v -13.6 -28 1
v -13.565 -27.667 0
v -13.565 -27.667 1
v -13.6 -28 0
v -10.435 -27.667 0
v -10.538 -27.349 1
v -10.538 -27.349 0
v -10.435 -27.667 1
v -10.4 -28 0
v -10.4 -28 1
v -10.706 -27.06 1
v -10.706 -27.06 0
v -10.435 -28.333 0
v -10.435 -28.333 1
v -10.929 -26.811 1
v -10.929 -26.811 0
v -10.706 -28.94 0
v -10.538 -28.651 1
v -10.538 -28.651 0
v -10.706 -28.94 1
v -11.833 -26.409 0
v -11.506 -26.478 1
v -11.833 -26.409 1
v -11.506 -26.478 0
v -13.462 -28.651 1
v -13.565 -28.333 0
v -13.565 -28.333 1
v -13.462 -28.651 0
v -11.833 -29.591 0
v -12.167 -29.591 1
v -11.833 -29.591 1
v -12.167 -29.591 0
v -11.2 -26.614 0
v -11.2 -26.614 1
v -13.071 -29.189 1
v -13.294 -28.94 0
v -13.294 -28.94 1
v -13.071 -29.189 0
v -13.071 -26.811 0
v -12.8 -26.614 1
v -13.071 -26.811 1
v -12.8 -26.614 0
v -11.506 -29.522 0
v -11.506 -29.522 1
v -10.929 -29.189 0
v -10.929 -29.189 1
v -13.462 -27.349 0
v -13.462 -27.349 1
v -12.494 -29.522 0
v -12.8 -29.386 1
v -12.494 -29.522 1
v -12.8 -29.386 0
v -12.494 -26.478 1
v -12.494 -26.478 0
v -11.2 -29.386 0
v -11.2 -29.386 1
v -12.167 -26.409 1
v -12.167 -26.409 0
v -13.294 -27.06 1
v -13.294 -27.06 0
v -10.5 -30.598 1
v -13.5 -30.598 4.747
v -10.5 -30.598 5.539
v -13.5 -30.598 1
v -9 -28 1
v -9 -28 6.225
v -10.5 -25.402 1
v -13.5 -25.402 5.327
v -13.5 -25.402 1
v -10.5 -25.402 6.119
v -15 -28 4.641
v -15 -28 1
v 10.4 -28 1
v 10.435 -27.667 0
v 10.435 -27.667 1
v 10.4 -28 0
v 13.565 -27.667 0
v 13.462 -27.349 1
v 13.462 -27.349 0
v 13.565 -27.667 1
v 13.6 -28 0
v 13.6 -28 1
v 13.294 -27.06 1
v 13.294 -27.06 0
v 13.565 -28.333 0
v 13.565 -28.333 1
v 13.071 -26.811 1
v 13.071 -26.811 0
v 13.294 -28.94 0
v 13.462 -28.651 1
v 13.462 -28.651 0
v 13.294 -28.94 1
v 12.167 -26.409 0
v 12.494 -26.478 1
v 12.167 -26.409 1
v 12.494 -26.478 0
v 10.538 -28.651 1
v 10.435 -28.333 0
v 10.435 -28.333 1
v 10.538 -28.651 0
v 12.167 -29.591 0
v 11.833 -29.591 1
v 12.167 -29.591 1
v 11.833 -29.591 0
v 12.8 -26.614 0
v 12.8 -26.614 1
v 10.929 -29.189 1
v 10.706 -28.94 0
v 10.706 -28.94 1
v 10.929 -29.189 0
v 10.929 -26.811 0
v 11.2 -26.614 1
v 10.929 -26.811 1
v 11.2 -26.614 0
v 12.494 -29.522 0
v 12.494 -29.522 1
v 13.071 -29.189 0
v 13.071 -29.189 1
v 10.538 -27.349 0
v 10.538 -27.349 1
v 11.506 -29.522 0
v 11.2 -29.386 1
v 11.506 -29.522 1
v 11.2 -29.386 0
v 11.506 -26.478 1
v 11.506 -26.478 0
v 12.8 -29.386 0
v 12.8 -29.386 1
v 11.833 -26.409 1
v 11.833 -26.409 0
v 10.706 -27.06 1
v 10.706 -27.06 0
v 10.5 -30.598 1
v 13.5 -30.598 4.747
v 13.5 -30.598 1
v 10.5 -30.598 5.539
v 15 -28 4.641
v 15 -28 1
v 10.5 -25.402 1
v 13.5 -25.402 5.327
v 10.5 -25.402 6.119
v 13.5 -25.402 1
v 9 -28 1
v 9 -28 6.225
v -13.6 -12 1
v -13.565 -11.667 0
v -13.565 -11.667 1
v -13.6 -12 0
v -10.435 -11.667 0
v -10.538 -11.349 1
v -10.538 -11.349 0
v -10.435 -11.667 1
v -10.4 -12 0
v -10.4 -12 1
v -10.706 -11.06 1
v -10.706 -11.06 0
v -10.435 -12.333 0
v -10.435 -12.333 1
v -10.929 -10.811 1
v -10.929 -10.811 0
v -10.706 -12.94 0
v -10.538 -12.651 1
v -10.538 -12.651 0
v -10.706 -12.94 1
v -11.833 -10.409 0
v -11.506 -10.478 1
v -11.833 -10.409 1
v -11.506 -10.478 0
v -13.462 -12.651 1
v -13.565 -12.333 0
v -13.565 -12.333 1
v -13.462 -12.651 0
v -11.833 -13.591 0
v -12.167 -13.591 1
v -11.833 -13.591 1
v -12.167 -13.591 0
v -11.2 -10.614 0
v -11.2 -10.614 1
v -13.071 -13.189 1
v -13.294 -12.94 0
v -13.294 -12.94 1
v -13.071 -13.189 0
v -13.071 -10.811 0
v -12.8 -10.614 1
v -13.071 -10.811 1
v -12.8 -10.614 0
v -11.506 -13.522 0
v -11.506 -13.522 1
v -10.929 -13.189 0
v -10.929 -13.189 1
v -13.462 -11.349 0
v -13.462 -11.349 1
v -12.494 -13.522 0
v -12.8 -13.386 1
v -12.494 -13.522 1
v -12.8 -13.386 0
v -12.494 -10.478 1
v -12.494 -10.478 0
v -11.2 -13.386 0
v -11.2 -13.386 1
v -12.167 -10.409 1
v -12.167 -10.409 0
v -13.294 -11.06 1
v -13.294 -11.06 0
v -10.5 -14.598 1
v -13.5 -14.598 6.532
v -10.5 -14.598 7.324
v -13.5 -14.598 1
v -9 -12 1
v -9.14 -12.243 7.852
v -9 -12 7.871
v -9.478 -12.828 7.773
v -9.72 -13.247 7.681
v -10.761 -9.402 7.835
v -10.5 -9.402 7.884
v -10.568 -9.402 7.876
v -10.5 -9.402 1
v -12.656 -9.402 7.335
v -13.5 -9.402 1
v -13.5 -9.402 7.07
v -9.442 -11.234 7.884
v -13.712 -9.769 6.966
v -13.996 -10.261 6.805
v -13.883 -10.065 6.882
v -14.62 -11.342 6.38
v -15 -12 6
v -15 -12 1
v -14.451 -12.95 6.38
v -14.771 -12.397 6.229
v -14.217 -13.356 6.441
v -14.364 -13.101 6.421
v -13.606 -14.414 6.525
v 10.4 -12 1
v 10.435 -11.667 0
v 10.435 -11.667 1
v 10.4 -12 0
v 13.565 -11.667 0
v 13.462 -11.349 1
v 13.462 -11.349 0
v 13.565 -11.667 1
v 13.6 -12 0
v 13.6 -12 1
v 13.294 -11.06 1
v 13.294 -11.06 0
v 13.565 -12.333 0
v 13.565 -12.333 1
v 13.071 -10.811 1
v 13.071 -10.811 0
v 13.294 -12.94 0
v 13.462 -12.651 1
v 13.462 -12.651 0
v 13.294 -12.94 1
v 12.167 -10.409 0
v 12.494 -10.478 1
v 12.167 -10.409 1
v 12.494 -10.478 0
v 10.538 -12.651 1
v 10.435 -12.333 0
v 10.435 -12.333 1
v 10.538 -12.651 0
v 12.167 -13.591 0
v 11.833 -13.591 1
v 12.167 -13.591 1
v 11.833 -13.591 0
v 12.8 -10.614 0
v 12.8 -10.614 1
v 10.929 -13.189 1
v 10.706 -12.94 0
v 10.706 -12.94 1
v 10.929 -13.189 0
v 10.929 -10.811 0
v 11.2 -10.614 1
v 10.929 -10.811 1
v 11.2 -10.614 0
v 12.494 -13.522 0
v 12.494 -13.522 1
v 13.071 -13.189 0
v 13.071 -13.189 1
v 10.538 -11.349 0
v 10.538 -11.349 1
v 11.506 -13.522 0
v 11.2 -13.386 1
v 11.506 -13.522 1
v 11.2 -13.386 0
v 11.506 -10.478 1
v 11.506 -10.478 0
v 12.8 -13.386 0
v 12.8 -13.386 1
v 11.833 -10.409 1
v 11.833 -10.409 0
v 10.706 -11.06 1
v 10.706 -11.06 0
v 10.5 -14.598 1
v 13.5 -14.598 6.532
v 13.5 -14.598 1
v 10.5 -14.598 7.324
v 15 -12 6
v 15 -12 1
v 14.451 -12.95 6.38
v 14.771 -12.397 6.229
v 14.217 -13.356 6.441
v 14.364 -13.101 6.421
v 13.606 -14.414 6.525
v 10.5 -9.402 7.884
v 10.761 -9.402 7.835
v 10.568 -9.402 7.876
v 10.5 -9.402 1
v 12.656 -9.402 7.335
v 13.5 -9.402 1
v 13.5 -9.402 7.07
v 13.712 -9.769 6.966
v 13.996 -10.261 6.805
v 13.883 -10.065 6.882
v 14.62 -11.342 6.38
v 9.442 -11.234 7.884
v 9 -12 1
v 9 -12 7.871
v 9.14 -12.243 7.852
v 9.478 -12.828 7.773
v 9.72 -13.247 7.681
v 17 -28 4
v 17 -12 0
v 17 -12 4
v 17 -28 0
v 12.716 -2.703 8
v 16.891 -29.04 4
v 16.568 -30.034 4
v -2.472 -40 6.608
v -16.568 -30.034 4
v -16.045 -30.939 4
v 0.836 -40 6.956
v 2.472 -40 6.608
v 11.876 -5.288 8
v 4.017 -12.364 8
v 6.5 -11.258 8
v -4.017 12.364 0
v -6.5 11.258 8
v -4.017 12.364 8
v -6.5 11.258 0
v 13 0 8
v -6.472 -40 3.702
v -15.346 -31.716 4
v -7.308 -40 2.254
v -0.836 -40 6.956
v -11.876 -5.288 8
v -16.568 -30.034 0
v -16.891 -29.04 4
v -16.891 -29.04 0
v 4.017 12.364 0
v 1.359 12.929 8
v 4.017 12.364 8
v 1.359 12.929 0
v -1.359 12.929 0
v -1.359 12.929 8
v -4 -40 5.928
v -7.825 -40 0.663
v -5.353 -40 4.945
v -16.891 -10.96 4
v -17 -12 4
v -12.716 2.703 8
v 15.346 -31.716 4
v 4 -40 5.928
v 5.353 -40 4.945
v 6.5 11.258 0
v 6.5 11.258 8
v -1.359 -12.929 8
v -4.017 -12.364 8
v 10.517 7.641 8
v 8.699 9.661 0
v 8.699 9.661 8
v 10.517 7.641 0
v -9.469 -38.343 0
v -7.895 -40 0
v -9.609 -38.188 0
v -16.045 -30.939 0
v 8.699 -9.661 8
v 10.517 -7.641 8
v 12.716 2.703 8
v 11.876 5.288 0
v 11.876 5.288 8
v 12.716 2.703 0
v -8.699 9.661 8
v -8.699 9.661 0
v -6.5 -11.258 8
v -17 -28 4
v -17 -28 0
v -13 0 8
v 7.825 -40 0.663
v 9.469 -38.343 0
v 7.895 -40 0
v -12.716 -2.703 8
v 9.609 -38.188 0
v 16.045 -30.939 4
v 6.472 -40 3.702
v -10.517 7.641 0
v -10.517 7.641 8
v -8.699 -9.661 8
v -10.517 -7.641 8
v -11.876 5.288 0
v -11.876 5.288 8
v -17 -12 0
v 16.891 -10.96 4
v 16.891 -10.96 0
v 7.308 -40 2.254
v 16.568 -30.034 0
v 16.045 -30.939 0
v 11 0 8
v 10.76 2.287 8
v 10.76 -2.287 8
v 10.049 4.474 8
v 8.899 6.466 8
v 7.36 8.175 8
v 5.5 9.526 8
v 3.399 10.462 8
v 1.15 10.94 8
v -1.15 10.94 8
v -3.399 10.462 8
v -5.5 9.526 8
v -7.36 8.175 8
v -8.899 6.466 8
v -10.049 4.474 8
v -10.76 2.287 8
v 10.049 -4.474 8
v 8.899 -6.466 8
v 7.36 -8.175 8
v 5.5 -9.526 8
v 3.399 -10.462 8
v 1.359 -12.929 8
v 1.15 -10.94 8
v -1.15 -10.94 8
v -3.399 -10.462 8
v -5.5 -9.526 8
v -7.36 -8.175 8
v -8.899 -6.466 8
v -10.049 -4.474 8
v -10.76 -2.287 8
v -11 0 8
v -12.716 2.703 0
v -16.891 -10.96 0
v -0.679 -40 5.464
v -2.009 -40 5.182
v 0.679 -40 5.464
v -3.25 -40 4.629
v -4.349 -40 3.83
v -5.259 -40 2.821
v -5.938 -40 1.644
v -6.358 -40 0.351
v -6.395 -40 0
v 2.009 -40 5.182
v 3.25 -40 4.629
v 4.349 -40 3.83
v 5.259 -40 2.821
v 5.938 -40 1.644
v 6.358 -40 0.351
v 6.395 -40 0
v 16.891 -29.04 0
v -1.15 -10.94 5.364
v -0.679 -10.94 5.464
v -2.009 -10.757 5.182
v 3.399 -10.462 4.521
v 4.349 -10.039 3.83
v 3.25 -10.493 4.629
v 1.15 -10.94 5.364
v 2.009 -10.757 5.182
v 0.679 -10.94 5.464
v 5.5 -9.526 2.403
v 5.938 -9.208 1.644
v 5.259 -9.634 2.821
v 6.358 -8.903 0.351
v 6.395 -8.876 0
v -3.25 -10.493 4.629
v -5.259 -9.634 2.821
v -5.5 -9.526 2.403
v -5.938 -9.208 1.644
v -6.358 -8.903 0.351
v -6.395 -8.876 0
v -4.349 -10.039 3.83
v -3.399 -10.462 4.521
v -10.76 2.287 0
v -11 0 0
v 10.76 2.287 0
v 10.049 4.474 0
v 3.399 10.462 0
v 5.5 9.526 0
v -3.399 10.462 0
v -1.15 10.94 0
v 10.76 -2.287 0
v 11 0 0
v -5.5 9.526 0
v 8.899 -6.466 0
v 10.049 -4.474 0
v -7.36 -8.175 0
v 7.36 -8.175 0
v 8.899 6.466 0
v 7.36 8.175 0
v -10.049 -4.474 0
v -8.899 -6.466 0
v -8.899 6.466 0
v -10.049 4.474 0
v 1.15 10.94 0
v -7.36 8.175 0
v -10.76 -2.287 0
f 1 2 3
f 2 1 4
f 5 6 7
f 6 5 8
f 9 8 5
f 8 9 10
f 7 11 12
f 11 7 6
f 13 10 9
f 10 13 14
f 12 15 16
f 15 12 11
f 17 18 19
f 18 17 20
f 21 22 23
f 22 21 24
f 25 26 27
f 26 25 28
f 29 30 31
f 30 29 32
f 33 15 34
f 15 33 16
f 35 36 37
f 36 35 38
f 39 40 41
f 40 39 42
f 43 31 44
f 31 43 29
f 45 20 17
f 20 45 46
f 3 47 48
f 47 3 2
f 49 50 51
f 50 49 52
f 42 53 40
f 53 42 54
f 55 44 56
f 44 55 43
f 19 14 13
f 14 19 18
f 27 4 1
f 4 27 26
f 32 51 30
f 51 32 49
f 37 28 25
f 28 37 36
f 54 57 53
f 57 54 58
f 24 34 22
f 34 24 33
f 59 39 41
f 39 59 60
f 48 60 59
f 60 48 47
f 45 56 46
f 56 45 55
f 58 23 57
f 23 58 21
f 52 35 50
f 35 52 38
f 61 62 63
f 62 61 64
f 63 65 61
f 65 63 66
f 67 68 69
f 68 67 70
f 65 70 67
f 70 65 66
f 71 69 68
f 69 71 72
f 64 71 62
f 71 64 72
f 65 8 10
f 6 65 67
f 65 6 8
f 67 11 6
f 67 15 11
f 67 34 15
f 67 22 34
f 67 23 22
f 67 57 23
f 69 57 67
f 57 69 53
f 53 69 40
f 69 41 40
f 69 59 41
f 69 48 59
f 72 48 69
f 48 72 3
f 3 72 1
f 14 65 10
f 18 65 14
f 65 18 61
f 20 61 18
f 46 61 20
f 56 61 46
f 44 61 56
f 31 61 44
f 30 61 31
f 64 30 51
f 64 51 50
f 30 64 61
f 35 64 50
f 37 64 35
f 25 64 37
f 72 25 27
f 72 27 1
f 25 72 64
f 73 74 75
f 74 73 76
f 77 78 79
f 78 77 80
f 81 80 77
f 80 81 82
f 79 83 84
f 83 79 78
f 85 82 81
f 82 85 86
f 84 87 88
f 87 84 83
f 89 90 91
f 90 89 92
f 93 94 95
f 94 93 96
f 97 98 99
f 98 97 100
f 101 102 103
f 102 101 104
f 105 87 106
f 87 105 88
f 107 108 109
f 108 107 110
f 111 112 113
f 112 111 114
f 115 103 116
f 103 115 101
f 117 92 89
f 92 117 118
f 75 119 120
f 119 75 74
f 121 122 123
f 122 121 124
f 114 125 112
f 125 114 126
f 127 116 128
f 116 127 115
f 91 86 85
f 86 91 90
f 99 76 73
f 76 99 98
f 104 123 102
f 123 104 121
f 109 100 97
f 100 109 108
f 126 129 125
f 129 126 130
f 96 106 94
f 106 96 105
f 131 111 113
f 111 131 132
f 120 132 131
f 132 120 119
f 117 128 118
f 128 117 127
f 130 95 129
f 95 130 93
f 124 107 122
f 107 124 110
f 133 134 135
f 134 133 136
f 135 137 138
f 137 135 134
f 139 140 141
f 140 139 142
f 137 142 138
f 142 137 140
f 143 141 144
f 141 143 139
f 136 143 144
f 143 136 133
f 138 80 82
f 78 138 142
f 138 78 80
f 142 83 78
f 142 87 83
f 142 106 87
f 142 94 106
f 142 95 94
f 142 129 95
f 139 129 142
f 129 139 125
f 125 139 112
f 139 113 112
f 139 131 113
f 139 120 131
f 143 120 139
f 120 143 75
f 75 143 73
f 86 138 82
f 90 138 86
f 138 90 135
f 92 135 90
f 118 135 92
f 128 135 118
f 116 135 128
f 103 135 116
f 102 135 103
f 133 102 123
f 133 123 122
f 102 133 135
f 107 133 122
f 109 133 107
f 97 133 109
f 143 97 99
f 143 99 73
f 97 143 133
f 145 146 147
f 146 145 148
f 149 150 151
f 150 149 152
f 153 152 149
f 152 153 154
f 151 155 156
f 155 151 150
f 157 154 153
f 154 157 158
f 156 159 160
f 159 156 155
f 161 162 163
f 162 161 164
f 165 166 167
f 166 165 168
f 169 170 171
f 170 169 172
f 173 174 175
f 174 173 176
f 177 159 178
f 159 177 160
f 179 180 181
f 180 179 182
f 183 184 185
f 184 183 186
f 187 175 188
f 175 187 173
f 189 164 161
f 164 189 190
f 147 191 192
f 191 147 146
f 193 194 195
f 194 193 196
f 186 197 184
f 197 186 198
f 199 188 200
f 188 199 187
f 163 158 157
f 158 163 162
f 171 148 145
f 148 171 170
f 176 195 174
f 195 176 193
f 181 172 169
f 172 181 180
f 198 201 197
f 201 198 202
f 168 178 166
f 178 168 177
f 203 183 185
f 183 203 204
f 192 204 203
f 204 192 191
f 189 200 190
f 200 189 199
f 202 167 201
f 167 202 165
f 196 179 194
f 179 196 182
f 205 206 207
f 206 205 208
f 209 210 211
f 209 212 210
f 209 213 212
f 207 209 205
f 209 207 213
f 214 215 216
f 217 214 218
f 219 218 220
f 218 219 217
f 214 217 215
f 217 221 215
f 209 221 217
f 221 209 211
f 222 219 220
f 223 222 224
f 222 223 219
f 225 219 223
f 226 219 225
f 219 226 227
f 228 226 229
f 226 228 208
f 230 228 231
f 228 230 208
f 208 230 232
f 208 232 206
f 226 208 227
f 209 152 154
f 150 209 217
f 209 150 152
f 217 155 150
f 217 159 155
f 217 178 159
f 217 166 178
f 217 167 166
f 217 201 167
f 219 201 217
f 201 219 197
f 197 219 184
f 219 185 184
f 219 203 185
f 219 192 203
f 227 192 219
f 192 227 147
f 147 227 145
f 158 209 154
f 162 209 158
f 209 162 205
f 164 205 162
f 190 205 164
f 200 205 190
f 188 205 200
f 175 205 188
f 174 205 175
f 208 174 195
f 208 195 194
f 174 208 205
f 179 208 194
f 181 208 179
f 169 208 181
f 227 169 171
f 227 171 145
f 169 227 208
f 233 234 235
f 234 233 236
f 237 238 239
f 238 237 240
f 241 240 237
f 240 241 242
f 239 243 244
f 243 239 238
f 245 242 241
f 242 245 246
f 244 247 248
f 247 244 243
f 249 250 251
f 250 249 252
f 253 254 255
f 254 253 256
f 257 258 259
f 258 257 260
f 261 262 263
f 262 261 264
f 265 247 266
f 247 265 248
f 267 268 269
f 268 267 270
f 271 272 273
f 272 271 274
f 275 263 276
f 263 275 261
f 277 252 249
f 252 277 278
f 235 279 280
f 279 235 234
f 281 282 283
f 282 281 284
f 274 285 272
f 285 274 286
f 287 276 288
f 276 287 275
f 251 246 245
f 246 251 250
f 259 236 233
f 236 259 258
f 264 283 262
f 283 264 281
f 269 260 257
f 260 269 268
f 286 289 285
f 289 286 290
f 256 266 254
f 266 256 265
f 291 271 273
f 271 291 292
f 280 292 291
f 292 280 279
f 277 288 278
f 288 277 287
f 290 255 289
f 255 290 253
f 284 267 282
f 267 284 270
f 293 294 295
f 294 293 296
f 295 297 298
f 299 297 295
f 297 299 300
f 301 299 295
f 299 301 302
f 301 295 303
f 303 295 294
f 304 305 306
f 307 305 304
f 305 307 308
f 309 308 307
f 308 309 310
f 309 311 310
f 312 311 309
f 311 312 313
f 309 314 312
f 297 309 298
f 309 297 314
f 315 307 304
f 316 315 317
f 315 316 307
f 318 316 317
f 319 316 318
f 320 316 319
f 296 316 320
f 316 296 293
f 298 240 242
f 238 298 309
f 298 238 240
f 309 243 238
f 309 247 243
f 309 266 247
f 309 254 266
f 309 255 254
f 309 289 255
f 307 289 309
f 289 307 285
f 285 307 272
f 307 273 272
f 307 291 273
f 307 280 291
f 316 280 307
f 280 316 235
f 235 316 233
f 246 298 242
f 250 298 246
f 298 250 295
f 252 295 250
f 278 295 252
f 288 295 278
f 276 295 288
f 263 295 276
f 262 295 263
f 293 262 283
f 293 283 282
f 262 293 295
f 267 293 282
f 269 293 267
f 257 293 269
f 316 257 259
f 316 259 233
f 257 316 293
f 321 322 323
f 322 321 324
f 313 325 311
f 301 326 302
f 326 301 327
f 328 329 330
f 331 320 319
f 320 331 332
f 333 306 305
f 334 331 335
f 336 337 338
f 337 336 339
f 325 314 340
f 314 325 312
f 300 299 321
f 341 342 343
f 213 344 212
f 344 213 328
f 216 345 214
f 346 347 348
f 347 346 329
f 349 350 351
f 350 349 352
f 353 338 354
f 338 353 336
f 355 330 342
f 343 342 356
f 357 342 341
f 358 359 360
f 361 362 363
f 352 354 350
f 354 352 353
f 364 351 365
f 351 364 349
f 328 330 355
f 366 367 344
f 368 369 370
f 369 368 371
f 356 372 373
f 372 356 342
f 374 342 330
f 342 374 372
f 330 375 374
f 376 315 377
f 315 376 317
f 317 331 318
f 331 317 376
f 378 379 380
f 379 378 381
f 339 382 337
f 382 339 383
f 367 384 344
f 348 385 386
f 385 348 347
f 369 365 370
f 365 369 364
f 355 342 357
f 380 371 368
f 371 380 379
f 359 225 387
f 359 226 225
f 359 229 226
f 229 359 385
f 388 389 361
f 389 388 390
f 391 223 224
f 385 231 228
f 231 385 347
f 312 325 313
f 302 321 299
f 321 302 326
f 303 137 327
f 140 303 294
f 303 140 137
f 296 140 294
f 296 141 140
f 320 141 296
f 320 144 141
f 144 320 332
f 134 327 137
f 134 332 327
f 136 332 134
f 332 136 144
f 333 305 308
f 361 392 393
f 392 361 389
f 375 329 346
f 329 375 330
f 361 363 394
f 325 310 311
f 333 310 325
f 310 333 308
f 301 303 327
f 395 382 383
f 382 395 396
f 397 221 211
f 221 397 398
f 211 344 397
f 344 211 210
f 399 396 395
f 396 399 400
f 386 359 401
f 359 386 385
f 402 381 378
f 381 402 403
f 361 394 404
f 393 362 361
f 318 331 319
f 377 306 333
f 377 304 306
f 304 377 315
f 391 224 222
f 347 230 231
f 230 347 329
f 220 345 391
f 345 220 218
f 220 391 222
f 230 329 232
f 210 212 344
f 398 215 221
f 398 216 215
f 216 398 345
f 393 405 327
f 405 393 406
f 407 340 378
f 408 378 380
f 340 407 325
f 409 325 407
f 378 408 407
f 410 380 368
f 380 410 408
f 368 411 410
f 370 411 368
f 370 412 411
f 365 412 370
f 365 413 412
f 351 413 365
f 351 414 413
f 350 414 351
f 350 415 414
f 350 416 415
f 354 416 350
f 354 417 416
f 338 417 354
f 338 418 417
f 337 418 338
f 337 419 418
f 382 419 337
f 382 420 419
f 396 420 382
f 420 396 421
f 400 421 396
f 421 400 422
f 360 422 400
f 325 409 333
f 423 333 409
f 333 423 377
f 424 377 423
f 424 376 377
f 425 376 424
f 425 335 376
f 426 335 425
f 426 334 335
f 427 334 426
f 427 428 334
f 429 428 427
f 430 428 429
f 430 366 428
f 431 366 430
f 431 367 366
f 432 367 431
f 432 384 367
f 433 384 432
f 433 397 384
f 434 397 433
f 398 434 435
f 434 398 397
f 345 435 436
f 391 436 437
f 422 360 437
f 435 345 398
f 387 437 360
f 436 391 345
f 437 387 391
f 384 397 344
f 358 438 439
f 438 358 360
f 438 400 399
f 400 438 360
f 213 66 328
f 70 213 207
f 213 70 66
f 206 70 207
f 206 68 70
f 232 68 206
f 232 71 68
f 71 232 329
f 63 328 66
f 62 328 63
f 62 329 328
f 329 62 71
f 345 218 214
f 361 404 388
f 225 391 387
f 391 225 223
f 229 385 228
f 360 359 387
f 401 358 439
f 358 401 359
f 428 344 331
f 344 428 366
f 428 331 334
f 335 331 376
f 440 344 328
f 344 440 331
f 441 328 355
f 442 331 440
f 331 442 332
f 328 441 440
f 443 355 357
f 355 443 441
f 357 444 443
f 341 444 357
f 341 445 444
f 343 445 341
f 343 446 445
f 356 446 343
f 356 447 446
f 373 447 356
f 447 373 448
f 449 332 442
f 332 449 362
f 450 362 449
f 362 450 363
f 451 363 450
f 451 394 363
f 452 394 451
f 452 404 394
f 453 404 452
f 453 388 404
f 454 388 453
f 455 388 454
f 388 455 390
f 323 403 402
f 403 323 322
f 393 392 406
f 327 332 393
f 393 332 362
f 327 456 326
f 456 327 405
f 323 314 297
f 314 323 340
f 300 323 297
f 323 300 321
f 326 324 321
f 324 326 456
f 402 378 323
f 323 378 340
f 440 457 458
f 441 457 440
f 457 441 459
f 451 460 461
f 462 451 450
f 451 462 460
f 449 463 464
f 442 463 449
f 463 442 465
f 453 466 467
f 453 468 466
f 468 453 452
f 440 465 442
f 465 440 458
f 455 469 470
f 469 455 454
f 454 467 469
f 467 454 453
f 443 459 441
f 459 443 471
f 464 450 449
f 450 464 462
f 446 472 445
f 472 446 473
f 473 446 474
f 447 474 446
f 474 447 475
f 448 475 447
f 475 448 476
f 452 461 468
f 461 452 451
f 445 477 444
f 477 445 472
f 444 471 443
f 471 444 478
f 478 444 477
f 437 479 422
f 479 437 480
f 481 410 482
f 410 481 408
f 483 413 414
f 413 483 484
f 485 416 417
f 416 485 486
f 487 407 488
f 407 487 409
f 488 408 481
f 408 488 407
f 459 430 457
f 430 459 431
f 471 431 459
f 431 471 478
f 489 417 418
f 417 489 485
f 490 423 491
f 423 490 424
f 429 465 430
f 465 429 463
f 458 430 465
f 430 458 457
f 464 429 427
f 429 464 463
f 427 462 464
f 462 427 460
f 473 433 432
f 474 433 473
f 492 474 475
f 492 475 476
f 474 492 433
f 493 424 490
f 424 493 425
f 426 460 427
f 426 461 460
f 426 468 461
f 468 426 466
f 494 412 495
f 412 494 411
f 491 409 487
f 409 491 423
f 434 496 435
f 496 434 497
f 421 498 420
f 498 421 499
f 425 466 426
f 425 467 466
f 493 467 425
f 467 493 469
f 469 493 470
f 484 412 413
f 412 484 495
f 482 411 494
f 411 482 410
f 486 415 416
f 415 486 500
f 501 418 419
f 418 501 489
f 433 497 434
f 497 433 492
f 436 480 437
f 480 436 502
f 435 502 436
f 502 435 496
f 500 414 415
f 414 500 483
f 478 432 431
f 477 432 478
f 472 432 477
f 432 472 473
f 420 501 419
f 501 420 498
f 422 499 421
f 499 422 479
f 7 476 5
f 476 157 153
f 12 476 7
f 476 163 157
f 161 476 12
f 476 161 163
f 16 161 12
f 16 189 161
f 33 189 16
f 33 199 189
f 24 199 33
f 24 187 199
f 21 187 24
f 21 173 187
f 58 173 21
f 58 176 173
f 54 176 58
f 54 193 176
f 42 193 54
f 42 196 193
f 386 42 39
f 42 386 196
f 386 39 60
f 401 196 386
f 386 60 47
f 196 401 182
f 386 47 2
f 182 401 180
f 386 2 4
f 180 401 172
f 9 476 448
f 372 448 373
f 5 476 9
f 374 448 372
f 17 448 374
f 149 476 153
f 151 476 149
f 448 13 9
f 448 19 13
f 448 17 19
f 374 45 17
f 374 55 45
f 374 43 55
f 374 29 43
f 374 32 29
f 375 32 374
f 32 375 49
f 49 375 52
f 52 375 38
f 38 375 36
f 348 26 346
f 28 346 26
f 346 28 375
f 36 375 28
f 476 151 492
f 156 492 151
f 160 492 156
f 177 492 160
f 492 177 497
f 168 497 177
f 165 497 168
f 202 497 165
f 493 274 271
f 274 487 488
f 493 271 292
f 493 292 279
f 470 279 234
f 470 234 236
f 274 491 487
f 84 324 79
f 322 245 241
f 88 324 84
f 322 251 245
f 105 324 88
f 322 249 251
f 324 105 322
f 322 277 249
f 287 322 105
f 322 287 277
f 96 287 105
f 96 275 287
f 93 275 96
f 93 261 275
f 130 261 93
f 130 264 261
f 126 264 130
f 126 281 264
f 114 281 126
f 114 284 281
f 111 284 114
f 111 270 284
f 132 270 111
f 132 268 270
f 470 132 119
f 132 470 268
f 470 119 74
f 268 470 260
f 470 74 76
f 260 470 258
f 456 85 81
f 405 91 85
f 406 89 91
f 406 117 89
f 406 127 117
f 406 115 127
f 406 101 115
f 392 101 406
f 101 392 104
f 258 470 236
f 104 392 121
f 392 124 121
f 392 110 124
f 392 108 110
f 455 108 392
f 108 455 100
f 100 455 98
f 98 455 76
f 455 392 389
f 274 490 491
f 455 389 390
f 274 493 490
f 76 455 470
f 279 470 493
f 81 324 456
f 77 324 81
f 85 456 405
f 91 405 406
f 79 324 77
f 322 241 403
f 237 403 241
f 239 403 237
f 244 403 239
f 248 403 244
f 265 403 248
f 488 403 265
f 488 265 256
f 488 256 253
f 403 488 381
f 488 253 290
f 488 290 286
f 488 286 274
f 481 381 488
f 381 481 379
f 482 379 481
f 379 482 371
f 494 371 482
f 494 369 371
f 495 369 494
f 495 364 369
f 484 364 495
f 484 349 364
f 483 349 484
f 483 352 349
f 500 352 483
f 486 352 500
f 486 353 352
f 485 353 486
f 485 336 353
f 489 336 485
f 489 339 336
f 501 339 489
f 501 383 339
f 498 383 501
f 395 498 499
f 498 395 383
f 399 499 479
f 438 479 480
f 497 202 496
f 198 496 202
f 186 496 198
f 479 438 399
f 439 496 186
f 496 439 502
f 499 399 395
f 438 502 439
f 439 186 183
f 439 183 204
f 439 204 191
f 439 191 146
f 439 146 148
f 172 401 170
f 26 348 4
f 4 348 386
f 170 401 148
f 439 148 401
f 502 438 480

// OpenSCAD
// file: ../lib/ALU_profile_holder_top.scad
include <../../parameters.scad>



module ALU_profile_holder_top(deep=35) {
    wall_thickness = ALU_profile_holder_wall_thickness;
    
    module screw_holes() {
        translate([wall_thickness/2, 8, ALU_profile_width/2]) {
            rotate([0, 90, 0]) 
                cylinder(d=M6_screw_diameter, h=wall_thickness*2, center=true, $fn=20);
        }
        translate([wall_thickness/2, deep-10, ALU_profile_width/2]) {
                rotate([0, 90, 0])
                cylinder(d=M6_screw_diameter, h=wall_thickness*2, center=true, $fn=20);
            
        }
    }
    
    difference() {
        cube([ALU_profile_width+wall_thickness*2, deep+wall_thickness*2, ALU_profile_width]);
        translate([wall_thickness, -0.1, -0.1])
            cube([ALU_profile_width, deep+0.1, ALU_profile_width+0.2]);
        
        screw_holes();
        translate([ALU_profile_width+wall_thickness, 0, 0])
            screw_holes();
    }
}

ALU_profile_holder_top(35);
// file: ../888_3002.scad
include <../parameters.scad>
use <./lib/ALU_profile_holder_top.scad>


module carbon_tube() {
	difference() {
		cylinder(d=13, h=400, $fn=30);

		translate([0, 0, -1])
		cylinder(d=11, h=402, $fn=30);
	}
}

module 888_3002(side=true) {
	difference() {
		union() {
			hull() {
				cylinder(d=16, h=40, $fn=30);

				translate([-12, -5, 28])
				rotate([-90, 0, 0])
				cylinder(d=10, h=10, $fn=30);

				translate([12, -5, 28])
				rotate([-90, 0, 0])
				cylinder(d=10, h=10, $fn=30);

				translate([-12, -5, 12])
				rotate([-90, 0, 0])
				cylinder(d=10, h=10, $fn=30);

				translate([12, -5, 12])
				rotate([-90, 0, 0])
				cylinder(d=10, h=10, $fn=30);

				translate([0, -9, 0])
				rotate([-90, 0, 0])
				cylinder(d=26, h=18, $fn=30);

			}
		}
		
		// cut side
		if(side) {
			translate([-30, 0, -50])
			cube([200, 50, 100]);
		} else {
			translate([-30, -100, -50])
			cube([200, 100, 100]);
		}
		
		// carbon tube
		translate([0, 0, 0])
		cylinder(d=13, h=400, $fn=30);

		// tube holding screws
		translate([-12, -10, 28])
		rotate([-90, 0, 0])
		union() {
			cylinder(d=3.2, h=16, $fn=30);
			
			cylinder(d=8, h=3, $fn=30);

			translate([0, 0, 12])
			cylinder(d=6, h=10, $fn=6);
		}
		translate([12, -10, 28])
		rotate([-90, 0, 0])
		union() {
			cylinder(d=3.2, h=16, $fn=30);
			
			cylinder(d=8, h=3, $fn=30);

			translate([0, 0, 12])
			cylinder(d=6, h=10, $fn=6);
		}
		translate([-12, -10, 12])
		rotate([-90, 0, 0])
		union() {
			cylinder(d=3.2, h=16, $fn=30);
			
			cylinder(d=8, h=3, $fn=30);

			translate([0, 0, 12])
			cylinder(d=6, h=10, $fn=6);
		}
		translate([12, -10, 12])
		rotate([-90, 0, 0])
		union() {
			cylinder(d=3.2, h=16, $fn=30);
			
			cylinder(d=8, h=3, $fn=30);

			translate([0, 0, 12])
			cylinder(d=6, h=10, $fn=6);
		}

		// bearing hole
		translate([0, -15, 0])
		rotate([-90, 0, 0])
		cylinder(d=22, h=30, $fn=30);

		// part gap
		translate([-100, -1, -50])
		cube([200, 2, 200]);

		translate([0, -.1, -50])
		cube([200, .2, 200]);
	}
}

translate([0, 0, 11])
#carbon_tube();

888_3002();
888_3002(false);
// file: ../../parameters.scad
maximum_printable_size = 150;

layer_thickness = 0.3;
global_clearance = 0.5;


//Screw diameter and nut for M10 [mm]
M10_screw_diameter = 10.4;
M10_head_height = 10;
M10_head_diameter = 16+0.5;
M10_nut_height = 10.5;
M10_nut_diameter = 25.5;
M10_nut_pocket = 22.3;

//Screw diameter for M8 [mm]
M8_screw_diameter = 8.6;
M8_head_height = 8;
M8_head_diameter = 13.5;
M8_nut_height = 7.5;
M8_square_nut_thin_height = 4.5;
M8_nut_diameter = 14.4 + 0.5;
M8_nut_pocket = 13 + 0.5;
M8_washer_diameter = 16;
M8_washer_thickness = 1.5;


//Screw diameter and nut for M6 [mm]
M6_screw_diameter=6.5;
M6_head_diameter = 10+0.5;
M6_head_height = 6;
M6_nut_height = 4.9;
M6_nut_diameter = 11.8;
M6_nut_pocket = 10.4;
M6_square_nut_height = 3;
M6_square_nut_diameter = 10;
M6_washer_thickness = 1.6;

//Screw diameter and nut for M5 [mm]
M5_screw_diameter=5.5;
M5_head_height = 5;
M5_head_diameter = 13+0.5;
M5_nut_height = 4.5;
M5_nut_diameter = 9.4;
M5_nut_pocket = 8.4;

//Screw diameter and nut for M4 [mm]
M4_screw_diameter=4.5;
M4_screw_head_height = 4;
M4_nut_height = 3.2;
M4_nut_diameter = 8.4;
M4_nut_pocket = 7.5;

//Screw diameter and nut for M3 [mm]
M3_screw_diameter = 3.2;
M3_nut_height = 2.7;
M3_nut_diameter = 6.6;
M3_nut_pocket = 5.6;
M3_screw_head_height = 3;

//Screw diameter and nut for M2,5 [mm]
M2_5_screw_diameter = 2.7;
M2_5_nut_height = 2.3;
M2_5_nut_diameter = 6;
M2_5_nut_pocket = 5.5;

// kulove lozisko

bearing_efsm_08_h = 33+1;
bearing_efsm_08_m = 22;
bearing_efsm_08_db = 18;
bearing_efsm_08_ag = 10.5;
bearing_efsm_08_n = M4_screw_diameter;
bearing_efsm_08_a1 = 5.5;
bearing_efsm_08_d = 8.25;
bearing_efsm_08_B = 8; // ball height

bearing_efsm_10_h = 38+1;
bearing_efsm_10_m = 26;
bearing_efsm_10_db = 21.9;
bearing_efsm_10_ag = 12+0.2;
bearing_efsm_10_n = M5_screw_diameter;
bearing_efsm_10_a1 = 6.5;
bearing_efsm_10_d = 10.25;


bearing_efsm_12_width = 40+1;
bearing_efsm_12_h = bearing_efsm_12_width;
bearing_efsm_12_boltd = 28/2; // polovina vzdalenosti mezi srouby
bearing_efsm_12_m = bearing_efsm_12_boltd*2;
bearing_efsm_12_db = 25;
bearing_efsm_12_ag = 13;
bearing_efsm_12_a1 = 7;
bearing_efsm_12_n = M5_screw_diameter;
bearing_efsm_12_d = 12.15;
bearing_efsm_12_B = 10; // ball height
bearing_efsm_space = 1;

bearing_efsm_17_width = 54+1;
bearing_efsm_17_h = bearing_efsm_17_width;
bearing_efsm_17_boltd = 38/2; // polovina vzdalenosti mezi srouby
bearing_efsm_17_m = bearing_efsm_17_boltd*2;
bearing_efsm_17_db = 35;
bearing_efsm_17_ag = 18;
bearing_efsm_17_n = M6_screw_diameter;
bearing_efsm_17_a1 = 10;
bearing_efsm_17_B = 17; // ball height

//limcove lozisko
bearing_EFOM_10_L=26; //celkova sirka zakladny
bearing_EFOM_10_d1=10.3;//diametr otvoru real=10 mm
bearing_EFOM_10_dB=22;//diametr vystupku pro ulozeni lozika
bearing_EFOM_10_H=52;//celková delka zakladny
bearing_EFOM_10_J=36;// hole pitch
bearing_EFOM_10_A1=6.5;//vyska pouzdra
bearing_EFOM_10_Ag=12;//celkova vyska
bearing_EFOM_10_N1=5;//sirka otvoru pro sroub
bearing_EFOM_10_N2=8;//delka otvoru pro sroub
bearing_EFOM_10_m=36;//roztec der pro sroub
bearing_EFOM_10_h=9;//vyska lozika


608_bearing_outer_diameter = 22.3;
608_bearing_inner_diameter = 16;
608_bearing_thickness = 7.1;


// 20 KG servo parameters

servo_20kg_axis_offset = 9.375; // jak je osa mimo stredu
servo_20kg_body_x = 42;
servo_20kg_body_y = 21;
servo_20kg_body_z = 40;
servo_20kg_thread_x = 49/2;
servo_20kg_thread_y = 10/2;
servo_20kg_body_below = 10; // jak hluboko je tělo serva pod drzaky na srouby
servo_20kg_below = 25.8; // jak hluboko je páka serva pod drzaky na srouby

servo_20kg_bolt_d = 2.5+0.3;
servo_20kg_nut_d = 5+0.3;


//strain gauge
strain_gauge_width = 12.7;
strain_gauge_length = 75.1;
strain_gauge_screw_distance = 10;

//ALU profile
ALU_profile_width = 30.5;
ALU_profile_holder_wall_thickness = 3;
ALU_profile_groove_width = 8;

//pillow block bearing
//https://www.igus.eu/product/372
//Part no. KSTM-08
KSTM08_screws_distance = 33;         //m
KSTM08_screws_holes_diameter = 4.5;  //d2
KSTM08_flange_thickness = 6;         //h3
KSTM08_case_width = 9;               //C1
KSTM08_case_length = 47;             //a
KSTM08_ball_width = 12;              //B
KSTM08_ball_hole_diameter = 7.85;    //d1


//ložiska pro malý rotor
bearing_outer_diameter = 10.2;    // Rozměr B1 v nákresu s přídavkem na toleranci otvoru
bearing_thickness = 4;        // Rozměr B2 v nákresu
//bearing_shaft_length = 19.5;    // Rozměr B3 v nákresu, Originalni hodnota 19.5
bearing_shaft_length = 20;    // Rozměr B3 v nákresu


// Platform parameters ////////////////////////////////////////////


// Main cube profile lengths
profile_length_x = 600;
profile_length_y = 600;
profile_length_z = 260;


compresor_length_x = 410;
compresor_length_y = 140;
compresor_length_z = 310;


front_holder_width = 160;
front_holder_angle = 25;
front_holder_height = 60;
front_holder_offset = 15;
front_holder_height_offset = 75;

starting_platform_length = 800;
starting_platform_angle = 10;

// lock moving servo parameters
// static par.
servo_length = 40;
servo_width = 20;
servo_height = 40;
servo_axle_offset = 12.5;
servo_axle_height = 5;
servo_movement_angle = 70;
servo_movement_angle_offset = -35; // angle offset up
servo_force = 1.65; // [N/m] torque of servo

// dynamic par.
servo_arm_length = servo_width/2+ALU_profile_width/2+ALU_profile_holder_wall_thickness+4;
servo_travel_y = cos((servo_movement_angle-abs(servo_movement_angle_offset))/2)*servo_arm_length;
servo_arm_hole_length = (servo_arm_length/cos(servo_movement_angle/2))-servo_arm_length+M3_screw_diameter;
servo_joint_offset = sin(servo_movement_angle+servo_movement_angle_offset)*(servo_arm_length+servo_arm_hole_length)+servo_axle_offset;
servo_joint_offset_by_angle = -tan(servo_movement_angle_offset)*servo_arm_length;
servo_max_linear_force = servo_force/(servo_arm_length/1000); // max servo linear force [N]
servo_min_linear_force = cos(servo_movement_angle+abs(servo_movement_angle_offset))*servo_max_linear_force; // min servo linear force [N] in the most extreme position
servo_holding_linear_force = cos(servo_movement_angle+servo_movement_angle_offset)*servo_max_linear_force; // min servo linear force [N] in holding position

// lock static parameters
lock_screws_dia = 3.08;
lock_depth = 20;
lock_axle_diameter = 15;
lock_grab_axle_dia = 13;
lock_arms_joint_offset = 30;
lock_arms_joint_angle = 89;
lock_tooth_width = 2;

lock_tube_angle = 5;

// lock dynamic parameters
lock_push_force = (servo_holding_linear_force/cos(lock_arms_joint_angle))/cos(lock_arms_joint_angle); // lock arm pushing force on linear servo joint
lock_push_arm_length = 45;
lock_arm_force_ratio = 1; // lock arm change holding force ratio (0.5 = arm will have half holding force)
lock_hold_arm_length = lock_push_arm_length/lock_arm_force_ratio;
lock_holding_force = lock_push_force*lock_arm_force_ratio;
lock_joint_arm_length = lock_push_arm_length;
// main file
//@set_slicing_config(../../slicing/default.ini)
include <../../parameters.scad>

use <../888_3002.scad>

translate([0, 0, -1])
rotate([90, 0, 0])
888_3002(false);
